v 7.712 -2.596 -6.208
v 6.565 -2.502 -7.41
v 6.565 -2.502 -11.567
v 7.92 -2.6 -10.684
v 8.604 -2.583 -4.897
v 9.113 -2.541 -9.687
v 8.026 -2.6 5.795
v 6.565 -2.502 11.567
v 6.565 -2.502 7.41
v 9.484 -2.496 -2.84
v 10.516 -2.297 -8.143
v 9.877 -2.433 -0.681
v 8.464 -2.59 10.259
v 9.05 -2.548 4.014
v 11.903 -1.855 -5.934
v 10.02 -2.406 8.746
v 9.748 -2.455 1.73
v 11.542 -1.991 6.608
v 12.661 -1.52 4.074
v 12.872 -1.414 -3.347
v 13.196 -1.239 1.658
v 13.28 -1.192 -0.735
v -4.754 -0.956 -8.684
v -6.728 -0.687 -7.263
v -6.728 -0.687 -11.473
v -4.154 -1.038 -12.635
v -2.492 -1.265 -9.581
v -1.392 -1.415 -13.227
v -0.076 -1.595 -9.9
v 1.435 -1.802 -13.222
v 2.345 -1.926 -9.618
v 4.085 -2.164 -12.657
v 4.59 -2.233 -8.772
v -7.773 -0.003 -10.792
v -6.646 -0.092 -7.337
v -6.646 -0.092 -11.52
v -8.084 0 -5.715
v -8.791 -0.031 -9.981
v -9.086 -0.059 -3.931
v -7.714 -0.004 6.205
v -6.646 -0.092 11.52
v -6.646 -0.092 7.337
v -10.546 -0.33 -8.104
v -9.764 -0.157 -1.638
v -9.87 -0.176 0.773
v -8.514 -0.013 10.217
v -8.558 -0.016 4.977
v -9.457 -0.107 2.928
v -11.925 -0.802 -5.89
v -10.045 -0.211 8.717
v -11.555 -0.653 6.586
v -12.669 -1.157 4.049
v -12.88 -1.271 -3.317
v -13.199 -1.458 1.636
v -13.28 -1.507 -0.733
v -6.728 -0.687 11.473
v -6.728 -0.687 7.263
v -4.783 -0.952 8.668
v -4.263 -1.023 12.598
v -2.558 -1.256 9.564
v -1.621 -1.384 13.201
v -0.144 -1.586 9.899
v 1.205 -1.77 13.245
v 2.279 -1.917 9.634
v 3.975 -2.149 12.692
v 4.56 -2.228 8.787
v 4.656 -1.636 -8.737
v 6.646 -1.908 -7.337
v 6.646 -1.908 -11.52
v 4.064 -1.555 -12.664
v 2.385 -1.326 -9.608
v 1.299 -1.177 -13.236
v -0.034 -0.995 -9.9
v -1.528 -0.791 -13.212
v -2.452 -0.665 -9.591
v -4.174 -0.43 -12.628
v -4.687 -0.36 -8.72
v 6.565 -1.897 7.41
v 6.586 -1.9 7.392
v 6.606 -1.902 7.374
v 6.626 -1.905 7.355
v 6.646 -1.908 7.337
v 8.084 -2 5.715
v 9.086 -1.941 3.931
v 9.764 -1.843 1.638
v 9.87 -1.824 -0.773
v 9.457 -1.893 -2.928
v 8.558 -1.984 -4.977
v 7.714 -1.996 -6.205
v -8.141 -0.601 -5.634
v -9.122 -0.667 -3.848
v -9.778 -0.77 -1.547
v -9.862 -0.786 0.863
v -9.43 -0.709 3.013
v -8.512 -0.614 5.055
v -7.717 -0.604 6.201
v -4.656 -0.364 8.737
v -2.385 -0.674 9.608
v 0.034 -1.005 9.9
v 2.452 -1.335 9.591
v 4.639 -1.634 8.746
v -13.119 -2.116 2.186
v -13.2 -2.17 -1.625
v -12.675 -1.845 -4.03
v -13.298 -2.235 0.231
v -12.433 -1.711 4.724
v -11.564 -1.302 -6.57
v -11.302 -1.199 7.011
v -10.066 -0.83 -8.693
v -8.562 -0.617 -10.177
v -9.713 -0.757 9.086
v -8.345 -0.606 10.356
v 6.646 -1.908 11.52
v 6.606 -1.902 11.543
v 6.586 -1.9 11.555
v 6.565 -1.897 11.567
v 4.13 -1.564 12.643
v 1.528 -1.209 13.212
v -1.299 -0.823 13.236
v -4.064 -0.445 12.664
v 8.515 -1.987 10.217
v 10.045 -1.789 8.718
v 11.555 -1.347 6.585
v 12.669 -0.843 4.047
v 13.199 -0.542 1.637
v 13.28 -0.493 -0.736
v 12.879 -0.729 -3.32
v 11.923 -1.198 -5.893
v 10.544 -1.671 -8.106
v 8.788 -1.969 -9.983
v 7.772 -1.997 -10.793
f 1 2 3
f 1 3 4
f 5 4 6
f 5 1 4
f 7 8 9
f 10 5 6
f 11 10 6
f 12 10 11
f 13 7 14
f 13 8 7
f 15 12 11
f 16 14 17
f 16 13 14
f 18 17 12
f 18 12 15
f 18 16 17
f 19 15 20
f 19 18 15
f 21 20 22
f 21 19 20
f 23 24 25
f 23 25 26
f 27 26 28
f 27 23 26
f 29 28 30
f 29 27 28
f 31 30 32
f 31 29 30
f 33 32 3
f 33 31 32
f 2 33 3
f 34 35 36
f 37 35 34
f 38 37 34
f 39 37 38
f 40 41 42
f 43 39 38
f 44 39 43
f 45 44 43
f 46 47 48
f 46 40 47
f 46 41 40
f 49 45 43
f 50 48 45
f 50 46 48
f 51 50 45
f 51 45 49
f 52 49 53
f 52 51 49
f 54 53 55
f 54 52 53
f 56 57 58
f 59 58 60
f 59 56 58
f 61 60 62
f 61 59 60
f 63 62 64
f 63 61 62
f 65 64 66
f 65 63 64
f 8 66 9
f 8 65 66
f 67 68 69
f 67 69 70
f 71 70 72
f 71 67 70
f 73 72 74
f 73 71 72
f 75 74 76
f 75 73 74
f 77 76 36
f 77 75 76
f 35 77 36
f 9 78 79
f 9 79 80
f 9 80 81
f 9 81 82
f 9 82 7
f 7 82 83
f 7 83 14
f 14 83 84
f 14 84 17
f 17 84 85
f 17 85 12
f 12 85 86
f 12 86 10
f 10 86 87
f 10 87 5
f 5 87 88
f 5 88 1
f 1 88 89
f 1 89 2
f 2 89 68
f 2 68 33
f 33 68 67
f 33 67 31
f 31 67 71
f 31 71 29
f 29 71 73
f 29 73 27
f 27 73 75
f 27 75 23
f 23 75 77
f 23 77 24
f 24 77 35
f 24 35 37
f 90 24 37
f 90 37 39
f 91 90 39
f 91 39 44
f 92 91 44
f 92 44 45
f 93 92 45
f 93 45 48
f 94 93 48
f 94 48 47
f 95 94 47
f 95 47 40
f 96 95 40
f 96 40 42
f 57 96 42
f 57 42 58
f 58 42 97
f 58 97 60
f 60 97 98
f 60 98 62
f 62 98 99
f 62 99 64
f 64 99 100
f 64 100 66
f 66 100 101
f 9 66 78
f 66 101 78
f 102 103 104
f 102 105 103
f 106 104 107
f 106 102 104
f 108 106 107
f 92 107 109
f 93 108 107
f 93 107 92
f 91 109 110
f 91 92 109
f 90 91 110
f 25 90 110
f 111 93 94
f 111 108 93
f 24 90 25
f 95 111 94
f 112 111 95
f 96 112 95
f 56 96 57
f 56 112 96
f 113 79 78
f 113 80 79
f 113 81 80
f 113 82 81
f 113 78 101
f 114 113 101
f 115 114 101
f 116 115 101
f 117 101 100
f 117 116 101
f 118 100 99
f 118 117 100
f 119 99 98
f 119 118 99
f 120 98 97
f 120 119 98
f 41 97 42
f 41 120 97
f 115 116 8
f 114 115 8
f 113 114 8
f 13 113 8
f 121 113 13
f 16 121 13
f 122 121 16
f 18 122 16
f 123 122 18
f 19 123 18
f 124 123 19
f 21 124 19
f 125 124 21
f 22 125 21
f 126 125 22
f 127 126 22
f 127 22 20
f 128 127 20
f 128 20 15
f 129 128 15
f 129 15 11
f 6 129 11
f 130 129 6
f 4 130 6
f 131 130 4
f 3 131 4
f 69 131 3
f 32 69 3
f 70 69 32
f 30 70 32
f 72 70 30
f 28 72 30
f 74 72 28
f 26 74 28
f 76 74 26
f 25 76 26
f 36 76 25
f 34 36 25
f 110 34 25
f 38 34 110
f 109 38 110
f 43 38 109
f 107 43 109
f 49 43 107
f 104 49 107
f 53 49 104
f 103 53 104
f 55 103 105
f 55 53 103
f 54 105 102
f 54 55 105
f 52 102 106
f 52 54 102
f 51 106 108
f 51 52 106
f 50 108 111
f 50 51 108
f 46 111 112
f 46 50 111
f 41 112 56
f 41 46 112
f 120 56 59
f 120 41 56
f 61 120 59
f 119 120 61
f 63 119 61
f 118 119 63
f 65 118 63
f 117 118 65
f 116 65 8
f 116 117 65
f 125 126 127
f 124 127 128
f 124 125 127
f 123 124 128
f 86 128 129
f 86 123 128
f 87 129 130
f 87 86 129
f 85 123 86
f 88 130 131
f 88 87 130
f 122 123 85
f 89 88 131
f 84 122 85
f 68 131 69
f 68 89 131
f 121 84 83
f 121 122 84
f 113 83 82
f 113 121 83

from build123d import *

# Parameters (mm, degrees)
EXTRUDE_THIN1_DEPTH = 15
SKETCH2_OUTSIDE_W   = 38.632
SKETCH2_OUTSIDE_H   = 40.272
SKETCH2_OUTSIDE_R   = 13.3
SKETCH2_OUTSIDE_R_2 = 9.9
EXTRUDE1_DEPTH      = 30


with BuildPart() as part:
    # Sketch1 → Extrude-Thin1 (new, symmetric)
    with BuildSketch(Plane.XY):
        with BuildLine():
            ThreePointArc((14, 0), (10.511476834, -1.679487802), (6.646471406, -1.907974583))
            Line((6.646471406, -1.907974583), (-6.646471406, -0.092025417))
            ThreePointArc((-6.646471406, -0.092025417), (-10.511476834, -0.320512198), (-14, -2))
            Line((-14, -2), (-13.64, -2.48))
            ThreePointArc((-13.64, -2.48), (-10.360788224, -0.901281466), (-6.727683122, -0.686503892))
            Line((-6.727683122, -0.686503892), (6.565259691, -2.502453058))
            ThreePointArc((6.565259691, -2.502453058), (10.662165444, -2.26025707), (14.36, -0.48))
            Line((14.36, -0.48), (14, 0))
        make_face()
    extrude(amount=EXTRUDE_THIN1_DEPTH, both=True)

    # Sketch2 outside → Extrude1 (cut)
    # profile 1 of 2: a face of its own
    with BuildSketch(Plane(origin=(0, 0, 0), x_dir=(1, 0, 0), z_dir=(0, 1, 0))):
        with Locations((0.18, 0)):
            Rectangle(SKETCH2_OUTSIDE_W, SKETCH2_OUTSIDE_H)
        with Locations(Location((0, 0, 0), (0, 0, 299.579355848))):
            Circle(SKETCH2_OUTSIDE_R, mode=Mode.SUBTRACT)
    # profile 2 of 2: a face of its own
    with BuildSketch(Plane(origin=(0, 0, 0), x_dir=(1, 0, 0), z_dir=(0, 1, 0))):
        with Locations(Location((0, 0, 0), (0, 0, 311.541132012))):
            Circle(SKETCH2_OUTSIDE_R_2)
    extrude(amount=-EXTRUDE1_DEPTH, mode=Mode.SUBTRACT)


solid = part.part
